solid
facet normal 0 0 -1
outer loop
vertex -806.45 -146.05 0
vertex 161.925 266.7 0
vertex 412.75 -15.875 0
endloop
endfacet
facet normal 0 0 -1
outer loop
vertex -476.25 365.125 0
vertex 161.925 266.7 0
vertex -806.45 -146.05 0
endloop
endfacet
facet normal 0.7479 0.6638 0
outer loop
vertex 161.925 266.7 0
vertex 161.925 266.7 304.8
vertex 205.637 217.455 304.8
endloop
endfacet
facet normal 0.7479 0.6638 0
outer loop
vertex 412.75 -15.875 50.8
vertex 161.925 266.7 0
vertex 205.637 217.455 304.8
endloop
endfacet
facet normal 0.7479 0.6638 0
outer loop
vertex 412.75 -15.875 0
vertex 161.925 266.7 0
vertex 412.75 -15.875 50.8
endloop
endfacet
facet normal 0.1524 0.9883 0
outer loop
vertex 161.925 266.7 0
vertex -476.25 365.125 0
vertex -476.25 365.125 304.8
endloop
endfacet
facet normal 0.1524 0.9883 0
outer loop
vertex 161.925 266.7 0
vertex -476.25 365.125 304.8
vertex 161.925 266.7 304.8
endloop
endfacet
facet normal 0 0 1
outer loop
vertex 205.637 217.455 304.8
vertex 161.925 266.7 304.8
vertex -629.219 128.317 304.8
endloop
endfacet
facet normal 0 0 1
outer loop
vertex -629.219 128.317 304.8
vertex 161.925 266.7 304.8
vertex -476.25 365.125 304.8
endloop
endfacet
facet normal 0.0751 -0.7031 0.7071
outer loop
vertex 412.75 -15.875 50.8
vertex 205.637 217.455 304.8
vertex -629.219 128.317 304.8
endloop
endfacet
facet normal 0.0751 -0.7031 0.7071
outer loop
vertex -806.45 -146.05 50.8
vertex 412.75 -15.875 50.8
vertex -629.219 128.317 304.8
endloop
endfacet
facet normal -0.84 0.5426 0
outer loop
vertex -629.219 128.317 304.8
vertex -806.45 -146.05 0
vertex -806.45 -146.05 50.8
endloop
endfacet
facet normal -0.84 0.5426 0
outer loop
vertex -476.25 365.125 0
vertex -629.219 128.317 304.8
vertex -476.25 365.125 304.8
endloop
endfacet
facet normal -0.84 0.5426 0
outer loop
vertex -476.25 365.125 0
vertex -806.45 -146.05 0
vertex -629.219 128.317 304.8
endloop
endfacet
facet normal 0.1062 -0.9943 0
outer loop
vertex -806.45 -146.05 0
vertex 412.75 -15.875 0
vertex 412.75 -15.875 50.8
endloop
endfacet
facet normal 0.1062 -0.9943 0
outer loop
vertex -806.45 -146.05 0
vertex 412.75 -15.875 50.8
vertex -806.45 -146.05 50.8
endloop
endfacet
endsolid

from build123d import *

# Parameters (mm, degrees)
PAD_DEPTH    = 304.8
CHAMFER_SIZE = 254


with BuildPart() as part:
    # Sketch → Pad (new body)
    with BuildSketch(Plane.XY):
        Polygon((-806.45, -146.05), (-476.25, 365.125), (161.925, 266.7), (412.75, -15.875), align=None)
    extrude(amount=PAD_DEPTH)

    # Chamfer
    chamfer_edges = [part.edges().sort_by_distance(p)[0] for p in [
        (-196.85, -80.9625, 304.8),
    ]]
    chamfer(chamfer_edges, length=CHAMFER_SIZE)


solid = part.part
